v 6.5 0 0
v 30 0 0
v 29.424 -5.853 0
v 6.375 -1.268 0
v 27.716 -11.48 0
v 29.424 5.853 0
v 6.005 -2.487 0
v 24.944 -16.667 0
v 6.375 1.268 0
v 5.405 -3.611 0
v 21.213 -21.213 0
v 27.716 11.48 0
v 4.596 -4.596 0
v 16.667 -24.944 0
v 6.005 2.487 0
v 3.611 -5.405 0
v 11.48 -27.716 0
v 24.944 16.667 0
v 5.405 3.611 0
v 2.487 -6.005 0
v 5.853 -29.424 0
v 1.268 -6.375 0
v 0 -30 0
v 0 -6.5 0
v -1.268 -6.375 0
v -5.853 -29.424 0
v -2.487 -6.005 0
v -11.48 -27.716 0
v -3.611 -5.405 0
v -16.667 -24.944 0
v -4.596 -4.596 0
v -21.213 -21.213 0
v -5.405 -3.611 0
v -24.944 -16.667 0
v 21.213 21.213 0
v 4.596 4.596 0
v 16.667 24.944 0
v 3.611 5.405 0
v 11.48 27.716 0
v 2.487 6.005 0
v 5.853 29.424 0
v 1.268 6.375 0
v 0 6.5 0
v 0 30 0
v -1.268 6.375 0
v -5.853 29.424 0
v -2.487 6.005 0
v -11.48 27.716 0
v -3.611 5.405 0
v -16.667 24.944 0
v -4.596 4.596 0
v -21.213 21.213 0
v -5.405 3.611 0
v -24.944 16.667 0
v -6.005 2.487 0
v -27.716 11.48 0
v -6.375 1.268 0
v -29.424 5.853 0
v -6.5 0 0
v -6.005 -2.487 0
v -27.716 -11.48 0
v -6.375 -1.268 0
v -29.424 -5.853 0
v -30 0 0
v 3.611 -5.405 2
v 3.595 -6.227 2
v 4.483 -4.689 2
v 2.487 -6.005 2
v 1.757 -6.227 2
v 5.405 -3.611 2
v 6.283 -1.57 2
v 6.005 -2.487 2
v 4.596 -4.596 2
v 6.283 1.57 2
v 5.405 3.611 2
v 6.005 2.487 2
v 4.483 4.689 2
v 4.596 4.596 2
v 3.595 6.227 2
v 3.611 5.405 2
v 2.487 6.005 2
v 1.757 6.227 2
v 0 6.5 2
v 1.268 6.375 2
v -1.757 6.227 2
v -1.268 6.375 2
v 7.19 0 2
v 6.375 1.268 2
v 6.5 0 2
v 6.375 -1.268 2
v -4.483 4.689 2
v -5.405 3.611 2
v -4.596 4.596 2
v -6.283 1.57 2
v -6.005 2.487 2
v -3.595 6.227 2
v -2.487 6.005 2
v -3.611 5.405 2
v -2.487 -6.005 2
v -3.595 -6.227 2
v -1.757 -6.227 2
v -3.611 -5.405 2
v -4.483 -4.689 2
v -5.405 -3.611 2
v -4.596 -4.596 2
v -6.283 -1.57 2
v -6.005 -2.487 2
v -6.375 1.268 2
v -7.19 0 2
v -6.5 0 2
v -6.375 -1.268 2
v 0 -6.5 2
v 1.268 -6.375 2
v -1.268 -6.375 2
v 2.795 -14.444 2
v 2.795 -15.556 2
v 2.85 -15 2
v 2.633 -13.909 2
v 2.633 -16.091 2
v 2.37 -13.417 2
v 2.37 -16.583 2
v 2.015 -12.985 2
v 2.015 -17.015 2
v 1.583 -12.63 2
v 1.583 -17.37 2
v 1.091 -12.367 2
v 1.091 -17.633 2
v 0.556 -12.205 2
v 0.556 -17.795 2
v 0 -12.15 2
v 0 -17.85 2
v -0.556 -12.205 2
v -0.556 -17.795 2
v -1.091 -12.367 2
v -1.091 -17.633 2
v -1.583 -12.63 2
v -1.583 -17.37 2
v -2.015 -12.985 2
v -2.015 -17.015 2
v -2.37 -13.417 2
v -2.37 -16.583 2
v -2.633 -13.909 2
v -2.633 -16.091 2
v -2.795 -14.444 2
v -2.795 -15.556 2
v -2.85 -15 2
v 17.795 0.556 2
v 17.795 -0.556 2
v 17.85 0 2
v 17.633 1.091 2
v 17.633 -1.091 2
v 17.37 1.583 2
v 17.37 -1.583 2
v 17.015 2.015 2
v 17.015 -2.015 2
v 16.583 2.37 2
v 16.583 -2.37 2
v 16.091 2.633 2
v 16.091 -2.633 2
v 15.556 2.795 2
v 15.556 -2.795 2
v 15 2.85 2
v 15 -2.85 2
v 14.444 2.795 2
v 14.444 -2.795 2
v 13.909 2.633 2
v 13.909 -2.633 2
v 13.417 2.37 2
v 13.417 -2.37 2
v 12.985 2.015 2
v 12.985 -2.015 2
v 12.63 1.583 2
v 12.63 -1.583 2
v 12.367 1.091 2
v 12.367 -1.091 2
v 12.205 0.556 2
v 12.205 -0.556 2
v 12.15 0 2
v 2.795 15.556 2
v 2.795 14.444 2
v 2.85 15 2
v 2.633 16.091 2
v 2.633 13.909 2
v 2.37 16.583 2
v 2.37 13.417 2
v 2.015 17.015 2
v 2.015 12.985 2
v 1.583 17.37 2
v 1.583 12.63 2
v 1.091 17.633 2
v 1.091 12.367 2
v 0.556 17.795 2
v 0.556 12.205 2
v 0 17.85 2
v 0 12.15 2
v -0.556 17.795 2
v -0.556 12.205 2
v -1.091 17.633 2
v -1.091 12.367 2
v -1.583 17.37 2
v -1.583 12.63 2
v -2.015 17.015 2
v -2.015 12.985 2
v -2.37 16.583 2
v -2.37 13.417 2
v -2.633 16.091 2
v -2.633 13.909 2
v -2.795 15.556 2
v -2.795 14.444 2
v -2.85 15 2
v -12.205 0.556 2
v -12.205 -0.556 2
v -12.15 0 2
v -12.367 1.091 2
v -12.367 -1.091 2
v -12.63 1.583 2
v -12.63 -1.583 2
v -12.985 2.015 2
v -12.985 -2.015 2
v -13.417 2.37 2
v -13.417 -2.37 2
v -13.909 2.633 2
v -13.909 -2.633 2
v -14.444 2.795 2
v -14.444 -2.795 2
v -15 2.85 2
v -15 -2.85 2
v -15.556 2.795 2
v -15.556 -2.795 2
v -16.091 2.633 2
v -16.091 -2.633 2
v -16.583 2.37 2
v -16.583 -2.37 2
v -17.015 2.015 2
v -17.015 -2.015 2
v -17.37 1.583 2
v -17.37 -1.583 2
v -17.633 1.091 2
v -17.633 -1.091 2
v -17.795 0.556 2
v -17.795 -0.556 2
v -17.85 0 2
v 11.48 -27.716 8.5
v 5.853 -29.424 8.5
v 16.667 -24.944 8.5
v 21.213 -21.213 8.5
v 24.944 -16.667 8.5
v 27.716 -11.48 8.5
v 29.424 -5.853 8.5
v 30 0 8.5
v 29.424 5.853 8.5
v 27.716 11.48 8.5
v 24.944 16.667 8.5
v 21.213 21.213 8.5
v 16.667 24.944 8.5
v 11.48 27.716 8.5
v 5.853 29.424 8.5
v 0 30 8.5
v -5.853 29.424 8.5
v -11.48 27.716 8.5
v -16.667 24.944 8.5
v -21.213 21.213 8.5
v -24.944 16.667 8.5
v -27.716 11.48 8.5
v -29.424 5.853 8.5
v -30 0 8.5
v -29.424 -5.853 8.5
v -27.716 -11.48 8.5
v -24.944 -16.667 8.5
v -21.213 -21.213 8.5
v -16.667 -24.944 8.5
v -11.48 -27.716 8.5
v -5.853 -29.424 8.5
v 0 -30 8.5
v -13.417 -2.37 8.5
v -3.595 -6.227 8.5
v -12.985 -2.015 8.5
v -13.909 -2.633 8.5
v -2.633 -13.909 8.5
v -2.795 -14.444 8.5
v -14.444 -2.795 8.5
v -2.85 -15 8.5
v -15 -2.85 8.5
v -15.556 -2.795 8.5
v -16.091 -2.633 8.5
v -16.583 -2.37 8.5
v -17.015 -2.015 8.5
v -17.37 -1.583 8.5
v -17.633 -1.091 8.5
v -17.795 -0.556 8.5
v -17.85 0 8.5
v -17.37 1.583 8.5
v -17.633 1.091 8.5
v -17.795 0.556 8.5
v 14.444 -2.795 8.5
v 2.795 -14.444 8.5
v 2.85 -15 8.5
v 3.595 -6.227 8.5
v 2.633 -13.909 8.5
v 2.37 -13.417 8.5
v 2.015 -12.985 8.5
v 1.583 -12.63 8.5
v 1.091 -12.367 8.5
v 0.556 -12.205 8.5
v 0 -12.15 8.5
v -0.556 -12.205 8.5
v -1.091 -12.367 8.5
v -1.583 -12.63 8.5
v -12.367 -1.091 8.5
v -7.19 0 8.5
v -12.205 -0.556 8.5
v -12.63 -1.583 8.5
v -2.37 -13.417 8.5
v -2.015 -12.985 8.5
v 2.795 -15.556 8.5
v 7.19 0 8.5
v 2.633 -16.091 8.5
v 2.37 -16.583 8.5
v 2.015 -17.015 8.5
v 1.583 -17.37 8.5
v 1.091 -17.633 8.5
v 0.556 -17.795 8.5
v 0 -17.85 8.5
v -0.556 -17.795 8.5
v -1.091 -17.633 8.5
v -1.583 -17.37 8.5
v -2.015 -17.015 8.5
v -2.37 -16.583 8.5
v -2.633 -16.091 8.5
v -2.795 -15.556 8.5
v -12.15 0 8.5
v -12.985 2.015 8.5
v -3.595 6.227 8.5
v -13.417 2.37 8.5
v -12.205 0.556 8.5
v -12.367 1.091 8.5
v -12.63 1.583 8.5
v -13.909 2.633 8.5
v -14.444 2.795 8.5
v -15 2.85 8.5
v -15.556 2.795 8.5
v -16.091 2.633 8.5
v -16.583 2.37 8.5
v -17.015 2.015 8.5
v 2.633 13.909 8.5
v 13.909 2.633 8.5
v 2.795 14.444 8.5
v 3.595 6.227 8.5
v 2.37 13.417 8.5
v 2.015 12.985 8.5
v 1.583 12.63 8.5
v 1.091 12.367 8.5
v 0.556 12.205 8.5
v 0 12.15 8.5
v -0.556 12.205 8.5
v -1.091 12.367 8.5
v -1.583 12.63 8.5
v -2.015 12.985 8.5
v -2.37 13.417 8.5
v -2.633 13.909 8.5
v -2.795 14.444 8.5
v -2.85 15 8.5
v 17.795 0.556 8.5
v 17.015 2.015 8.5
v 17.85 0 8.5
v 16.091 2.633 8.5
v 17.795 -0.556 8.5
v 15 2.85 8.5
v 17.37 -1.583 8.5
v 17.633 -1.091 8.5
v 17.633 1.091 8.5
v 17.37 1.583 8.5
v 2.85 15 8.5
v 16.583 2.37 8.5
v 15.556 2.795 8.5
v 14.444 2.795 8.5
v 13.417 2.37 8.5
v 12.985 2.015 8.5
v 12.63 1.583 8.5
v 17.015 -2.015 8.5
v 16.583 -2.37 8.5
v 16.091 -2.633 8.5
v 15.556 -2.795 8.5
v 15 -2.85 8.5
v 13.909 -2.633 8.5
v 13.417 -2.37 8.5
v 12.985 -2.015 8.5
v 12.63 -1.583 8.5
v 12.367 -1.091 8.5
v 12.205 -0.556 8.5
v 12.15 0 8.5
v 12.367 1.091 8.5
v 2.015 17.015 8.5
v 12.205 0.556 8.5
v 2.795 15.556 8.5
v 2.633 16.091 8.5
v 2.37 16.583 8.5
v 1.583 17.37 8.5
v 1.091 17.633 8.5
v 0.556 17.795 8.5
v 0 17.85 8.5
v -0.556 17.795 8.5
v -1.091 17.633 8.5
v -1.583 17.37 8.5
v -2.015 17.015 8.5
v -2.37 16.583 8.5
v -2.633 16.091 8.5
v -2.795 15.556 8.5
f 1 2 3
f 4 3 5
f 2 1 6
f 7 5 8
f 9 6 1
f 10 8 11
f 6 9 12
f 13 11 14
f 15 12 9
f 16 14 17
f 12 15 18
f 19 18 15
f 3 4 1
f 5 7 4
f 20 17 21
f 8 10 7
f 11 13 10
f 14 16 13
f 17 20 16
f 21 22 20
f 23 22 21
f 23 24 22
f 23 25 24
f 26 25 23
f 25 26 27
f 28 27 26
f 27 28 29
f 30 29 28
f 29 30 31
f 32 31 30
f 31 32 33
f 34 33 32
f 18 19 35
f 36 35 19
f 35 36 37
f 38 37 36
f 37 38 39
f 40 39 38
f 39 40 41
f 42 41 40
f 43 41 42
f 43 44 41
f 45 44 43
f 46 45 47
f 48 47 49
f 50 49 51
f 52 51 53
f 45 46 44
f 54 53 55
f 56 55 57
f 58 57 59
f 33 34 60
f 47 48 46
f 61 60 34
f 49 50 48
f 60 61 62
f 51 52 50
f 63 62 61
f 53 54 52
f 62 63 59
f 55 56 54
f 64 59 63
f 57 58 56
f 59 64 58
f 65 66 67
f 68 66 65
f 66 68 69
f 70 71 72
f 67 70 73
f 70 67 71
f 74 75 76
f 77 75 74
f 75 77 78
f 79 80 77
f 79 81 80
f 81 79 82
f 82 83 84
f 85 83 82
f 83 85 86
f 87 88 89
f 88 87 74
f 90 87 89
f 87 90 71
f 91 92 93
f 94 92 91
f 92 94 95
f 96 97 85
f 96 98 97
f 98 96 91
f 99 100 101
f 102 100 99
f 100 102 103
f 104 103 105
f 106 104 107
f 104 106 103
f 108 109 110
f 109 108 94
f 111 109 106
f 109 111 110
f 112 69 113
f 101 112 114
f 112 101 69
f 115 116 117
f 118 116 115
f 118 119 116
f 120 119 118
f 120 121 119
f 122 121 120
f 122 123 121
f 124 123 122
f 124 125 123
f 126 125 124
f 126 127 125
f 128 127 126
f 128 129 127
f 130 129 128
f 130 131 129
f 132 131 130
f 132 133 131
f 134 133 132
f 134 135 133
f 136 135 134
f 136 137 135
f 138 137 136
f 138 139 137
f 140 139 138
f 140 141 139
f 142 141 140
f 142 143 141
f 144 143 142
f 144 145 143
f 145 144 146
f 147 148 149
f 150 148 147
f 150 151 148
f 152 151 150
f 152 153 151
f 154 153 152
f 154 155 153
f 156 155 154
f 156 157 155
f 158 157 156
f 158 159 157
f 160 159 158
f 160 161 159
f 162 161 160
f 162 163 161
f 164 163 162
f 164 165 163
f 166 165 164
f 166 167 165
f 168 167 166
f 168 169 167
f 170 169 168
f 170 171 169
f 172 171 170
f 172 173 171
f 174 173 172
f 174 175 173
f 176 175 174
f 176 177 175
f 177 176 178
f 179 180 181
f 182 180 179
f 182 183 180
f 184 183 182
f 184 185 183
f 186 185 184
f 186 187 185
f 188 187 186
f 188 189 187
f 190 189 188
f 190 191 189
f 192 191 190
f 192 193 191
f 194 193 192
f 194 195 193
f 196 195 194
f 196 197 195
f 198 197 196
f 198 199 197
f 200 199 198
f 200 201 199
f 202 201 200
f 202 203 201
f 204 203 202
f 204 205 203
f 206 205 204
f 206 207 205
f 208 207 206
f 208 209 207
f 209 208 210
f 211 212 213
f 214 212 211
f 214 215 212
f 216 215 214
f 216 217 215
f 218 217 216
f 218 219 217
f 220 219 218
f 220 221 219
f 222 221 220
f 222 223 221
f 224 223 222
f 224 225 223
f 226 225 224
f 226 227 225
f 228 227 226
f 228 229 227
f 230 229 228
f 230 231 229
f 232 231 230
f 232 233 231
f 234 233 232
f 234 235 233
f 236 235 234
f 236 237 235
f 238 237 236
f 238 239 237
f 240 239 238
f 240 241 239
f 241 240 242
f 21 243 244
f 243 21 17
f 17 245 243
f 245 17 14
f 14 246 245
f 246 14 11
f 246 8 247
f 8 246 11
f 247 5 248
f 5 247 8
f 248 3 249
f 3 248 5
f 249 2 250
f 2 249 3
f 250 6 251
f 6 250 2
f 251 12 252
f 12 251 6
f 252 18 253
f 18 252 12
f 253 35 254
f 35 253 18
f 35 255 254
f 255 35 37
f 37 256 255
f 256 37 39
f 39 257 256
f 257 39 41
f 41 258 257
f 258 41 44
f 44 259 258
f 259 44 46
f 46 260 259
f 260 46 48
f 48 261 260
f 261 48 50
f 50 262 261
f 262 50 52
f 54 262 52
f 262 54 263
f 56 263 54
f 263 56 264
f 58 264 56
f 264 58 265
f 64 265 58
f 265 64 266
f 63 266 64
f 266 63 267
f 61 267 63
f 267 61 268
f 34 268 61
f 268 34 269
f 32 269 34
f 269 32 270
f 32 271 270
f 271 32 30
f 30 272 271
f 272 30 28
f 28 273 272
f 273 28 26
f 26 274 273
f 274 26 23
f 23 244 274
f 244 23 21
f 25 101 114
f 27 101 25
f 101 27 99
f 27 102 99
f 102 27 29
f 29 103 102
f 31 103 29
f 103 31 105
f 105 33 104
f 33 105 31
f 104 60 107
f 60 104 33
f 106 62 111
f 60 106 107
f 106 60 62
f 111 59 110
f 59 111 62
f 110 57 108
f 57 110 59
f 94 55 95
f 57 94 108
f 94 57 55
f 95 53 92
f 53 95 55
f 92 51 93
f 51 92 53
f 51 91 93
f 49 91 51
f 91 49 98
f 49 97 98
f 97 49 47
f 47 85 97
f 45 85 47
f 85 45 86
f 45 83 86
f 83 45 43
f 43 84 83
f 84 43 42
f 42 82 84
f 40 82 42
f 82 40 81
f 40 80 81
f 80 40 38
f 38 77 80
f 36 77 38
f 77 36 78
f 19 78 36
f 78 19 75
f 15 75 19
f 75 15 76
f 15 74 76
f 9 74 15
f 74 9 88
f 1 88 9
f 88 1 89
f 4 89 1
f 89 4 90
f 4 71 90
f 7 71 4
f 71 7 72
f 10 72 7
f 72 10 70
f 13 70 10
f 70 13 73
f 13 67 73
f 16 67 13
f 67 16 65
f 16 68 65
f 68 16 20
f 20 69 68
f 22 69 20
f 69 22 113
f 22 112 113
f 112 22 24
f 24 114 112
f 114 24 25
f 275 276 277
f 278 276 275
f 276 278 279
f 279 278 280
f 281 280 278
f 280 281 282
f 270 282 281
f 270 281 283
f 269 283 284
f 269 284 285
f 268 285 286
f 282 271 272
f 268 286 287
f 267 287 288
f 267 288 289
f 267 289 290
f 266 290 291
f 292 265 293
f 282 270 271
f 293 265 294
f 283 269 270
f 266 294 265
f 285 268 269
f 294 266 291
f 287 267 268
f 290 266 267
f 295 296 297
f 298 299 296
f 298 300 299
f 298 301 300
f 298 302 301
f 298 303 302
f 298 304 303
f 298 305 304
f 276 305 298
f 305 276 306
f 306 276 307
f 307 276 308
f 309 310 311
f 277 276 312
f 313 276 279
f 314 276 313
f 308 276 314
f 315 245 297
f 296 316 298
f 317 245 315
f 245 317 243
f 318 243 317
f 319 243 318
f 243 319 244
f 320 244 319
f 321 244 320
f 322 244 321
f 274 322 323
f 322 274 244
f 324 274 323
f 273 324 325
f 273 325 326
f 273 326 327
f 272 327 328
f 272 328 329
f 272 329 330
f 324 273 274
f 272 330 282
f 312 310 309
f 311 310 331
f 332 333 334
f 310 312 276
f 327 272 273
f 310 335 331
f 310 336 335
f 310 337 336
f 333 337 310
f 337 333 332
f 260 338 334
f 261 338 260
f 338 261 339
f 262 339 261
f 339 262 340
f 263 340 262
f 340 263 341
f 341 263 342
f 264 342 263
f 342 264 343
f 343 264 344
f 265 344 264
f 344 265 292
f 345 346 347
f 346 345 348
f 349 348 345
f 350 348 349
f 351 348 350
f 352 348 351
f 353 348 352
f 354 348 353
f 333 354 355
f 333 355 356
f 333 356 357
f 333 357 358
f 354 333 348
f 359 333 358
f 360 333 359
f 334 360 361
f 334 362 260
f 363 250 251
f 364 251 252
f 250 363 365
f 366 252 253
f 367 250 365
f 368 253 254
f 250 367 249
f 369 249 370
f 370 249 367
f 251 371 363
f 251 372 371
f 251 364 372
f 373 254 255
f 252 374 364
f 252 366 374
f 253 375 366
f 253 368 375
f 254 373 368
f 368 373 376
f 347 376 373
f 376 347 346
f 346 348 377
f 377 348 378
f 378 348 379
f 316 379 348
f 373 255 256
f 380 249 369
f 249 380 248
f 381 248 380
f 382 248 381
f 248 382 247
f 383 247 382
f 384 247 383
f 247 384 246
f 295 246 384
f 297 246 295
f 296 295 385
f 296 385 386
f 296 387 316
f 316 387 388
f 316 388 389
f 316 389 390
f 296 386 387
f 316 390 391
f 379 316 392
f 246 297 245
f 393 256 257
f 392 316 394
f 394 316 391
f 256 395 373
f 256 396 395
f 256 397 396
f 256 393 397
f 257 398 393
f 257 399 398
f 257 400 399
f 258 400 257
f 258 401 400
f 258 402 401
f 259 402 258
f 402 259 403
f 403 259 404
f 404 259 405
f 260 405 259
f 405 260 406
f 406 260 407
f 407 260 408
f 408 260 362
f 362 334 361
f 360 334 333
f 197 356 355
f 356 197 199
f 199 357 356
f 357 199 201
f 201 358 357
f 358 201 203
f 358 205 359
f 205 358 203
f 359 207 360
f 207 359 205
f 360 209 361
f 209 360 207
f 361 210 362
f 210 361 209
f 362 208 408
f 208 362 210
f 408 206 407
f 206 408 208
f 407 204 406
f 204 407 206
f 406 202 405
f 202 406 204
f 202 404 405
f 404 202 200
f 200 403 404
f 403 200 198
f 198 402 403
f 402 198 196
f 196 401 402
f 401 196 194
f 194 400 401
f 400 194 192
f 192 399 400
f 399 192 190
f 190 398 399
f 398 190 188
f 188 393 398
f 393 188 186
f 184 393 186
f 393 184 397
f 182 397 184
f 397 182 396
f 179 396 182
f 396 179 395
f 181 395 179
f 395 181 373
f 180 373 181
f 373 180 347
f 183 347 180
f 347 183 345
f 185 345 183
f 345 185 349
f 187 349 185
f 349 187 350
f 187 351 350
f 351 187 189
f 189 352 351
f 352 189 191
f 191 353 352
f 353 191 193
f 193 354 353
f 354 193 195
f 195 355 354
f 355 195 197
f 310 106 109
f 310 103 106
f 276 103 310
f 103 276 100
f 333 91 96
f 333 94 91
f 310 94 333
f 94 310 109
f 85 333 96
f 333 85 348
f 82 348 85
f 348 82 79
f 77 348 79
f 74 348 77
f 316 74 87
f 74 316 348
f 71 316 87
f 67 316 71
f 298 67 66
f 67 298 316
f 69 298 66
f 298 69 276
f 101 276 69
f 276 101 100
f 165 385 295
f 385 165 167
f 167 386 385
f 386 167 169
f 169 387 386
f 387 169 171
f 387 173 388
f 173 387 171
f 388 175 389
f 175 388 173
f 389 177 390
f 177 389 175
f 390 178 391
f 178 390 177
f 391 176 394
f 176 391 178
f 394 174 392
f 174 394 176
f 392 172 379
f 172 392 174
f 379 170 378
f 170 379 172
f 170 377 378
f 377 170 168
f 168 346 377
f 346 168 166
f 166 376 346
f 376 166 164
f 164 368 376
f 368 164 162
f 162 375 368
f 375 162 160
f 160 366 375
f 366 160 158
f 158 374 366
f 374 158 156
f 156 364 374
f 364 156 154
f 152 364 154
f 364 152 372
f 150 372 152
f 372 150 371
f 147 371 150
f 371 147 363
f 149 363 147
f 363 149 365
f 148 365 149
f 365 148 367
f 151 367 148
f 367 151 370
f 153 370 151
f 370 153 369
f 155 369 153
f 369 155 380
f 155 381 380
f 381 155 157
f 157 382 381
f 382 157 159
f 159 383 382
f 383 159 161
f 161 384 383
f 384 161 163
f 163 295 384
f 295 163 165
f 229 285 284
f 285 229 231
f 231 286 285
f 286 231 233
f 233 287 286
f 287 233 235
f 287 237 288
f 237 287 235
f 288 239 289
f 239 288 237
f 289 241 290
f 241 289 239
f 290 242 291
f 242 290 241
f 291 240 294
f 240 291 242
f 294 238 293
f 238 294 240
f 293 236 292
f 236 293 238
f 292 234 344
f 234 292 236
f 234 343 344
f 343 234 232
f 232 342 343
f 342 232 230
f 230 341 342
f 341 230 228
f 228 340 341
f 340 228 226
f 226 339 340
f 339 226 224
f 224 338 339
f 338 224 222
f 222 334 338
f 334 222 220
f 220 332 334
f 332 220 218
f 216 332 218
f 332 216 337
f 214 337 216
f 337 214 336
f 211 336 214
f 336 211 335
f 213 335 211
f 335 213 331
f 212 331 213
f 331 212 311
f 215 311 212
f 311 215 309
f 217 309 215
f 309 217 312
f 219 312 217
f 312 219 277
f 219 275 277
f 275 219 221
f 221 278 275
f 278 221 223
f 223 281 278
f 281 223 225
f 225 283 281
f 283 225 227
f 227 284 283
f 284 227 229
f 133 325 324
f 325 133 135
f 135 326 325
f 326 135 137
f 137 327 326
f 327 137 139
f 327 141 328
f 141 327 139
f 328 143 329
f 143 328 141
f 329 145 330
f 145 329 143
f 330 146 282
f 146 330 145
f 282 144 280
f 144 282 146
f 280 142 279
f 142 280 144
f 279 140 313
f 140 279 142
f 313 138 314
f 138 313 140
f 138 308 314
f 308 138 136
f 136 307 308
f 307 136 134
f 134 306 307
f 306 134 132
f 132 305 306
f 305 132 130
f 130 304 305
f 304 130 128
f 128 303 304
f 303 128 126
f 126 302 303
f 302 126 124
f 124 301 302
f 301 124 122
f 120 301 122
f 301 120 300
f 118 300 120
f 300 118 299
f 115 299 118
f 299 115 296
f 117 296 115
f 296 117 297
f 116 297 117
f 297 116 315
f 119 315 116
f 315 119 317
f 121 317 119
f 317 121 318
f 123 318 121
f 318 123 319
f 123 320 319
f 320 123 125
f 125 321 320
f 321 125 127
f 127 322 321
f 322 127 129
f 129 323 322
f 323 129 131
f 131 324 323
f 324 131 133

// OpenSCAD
// file: oem/generic/lib.scad
$fn = 32;

kEpsilon = 1e-1;

function property(table, key) = table[search([key], table)[0]][1];

module sector(radius, angles, fn = $fn) {
     r = radius / cos(180 / fn);
     step = -360 / fn;

     points = concat([[0, 0]],
                     [for(a = [angles[0] : step : angles[1] - 360])
                               [r * cos(a), r * sin(a)]
                          ],
                     [[r * cos(angles[1]), r * sin(angles[1])]]
          );

     difference() {
          circle(radius, $fn = fn);
          polygon(points);
     }
}

module ring(inner_radius, outer_radius, angles = [0, 360], fn = $fn) {
     difference() {
          sector(radius=outer_radius, angles=angles, fn=fn);
          sector(radius=inner_radius, angles=angles+[-kEpsilon, kEpsilon], fn=fn);
     }
}

module rounded_ring(inner_radius, outer_radius, angles = [0, 360], fn = $fn) {
     step_angle = 360 / fn;
     ring_width = outer_radius - inner_radius;
     ring_mean_radius = (outer_radius + inner_radius) / 2;
     for (theta = angles) {
          theta_d = theta / step_angle;
          theta_frac = (theta_d - floor(theta_d) - 0.5) * step_angle;
          rho = ring_mean_radius * cos(step_angle/2) / cos(theta_frac);
          rotate(theta)
          translate([rho, 0])
          circle(d=ring_width);
     }
     ring(inner_radius=inner_radius,
          outer_radius=outer_radius,
          angles=angles, fn=fn);
}

module fillet(r) {
     difference() {
          difference() {
               offset(r=-r - kEpsilon)
                    offset(delta=r) {
                    children();
               }
               offset(r=r)
                    offset(delta=-r) {
                    children();
               }
          }
          children();
     }
     offset(r=r)
          offset(delta=-r) {
          children();
     }
}

module bench_fillet(r, order=1000) {
     difference() {
          fillet(r) {
               translate([-order/2-kEpsilon, 0]) {
                    square([order, order], center=true);
               }
               children();
          }
          translate([-order/2-kEpsilon, 0]) {
               square([order+kEpsilon, order+kEpsilon], center=true);
          }
     }
}

module curved_bench_fillet(r, bench_radius, order=1000, internal=true) {
     difference() {
          fillet(r) {
               if (internal) {
                    translate([bench_radius, 0]) {
                         ring(inner_radius=bench_radius + kEpsilon, outer_radius=bench_radius * order);
                    }
               } else {
                    translate([-bench_radius, 0]) circle(r=bench_radius - kEpsilon);
               }
               children();
          }
          if (internal) {
               translate([bench_radius, 0]) {
                    ring(inner_radius=bench_radius,
                         outer_radius=bench_radius * order - kEpsilon);
               }
          } else {
               translate([-bench_radius, 0]) circle(r=bench_radius);
          }

     }
}


module window(side, position=[0, 0, 0], order=1000) {
    difference() {
        children();
        translate(position)  {
            difference() {
                square(order, center=true);
                square(side, center=true);
            }
        }
    }
}


module rounded_cylinder(diameter, height, fillet_radius, center) {
     translate([0, 0, ! center ? height/2 : 0]) {
          minkowski() {
               cylinder(d=(diameter - 2 * fillet_radius),
                        h=(height - 2 * fillet_radius),
                        center=true);
               sphere(r=fillet_radius);
          }
     }
}


module curved_support_xsection(support_radius, fillet_radius,
                               wall_inner_radius, wall_outer_radius,
                               hole_radius = 0, internal=true) {
     support_angular_width = (4 * support_radius / wall_outer_radius) * 180 / PI;
     wall_thickness = wall_outer_radius - wall_inner_radius;
     rotate([0, 0, internal ? 180 : 0]) {
          difference() {
               window(6*support_radius) {
                    curved_bench_fillet(fillet_radius, bench_radius=wall_inner_radius, internal=internal) {
                         hull() {
                              translate([support_radius + wall_thickness/2, 0]) {
                                   circle(r=support_radius);
                              }
                              rotate([0, 0, ! internal ? 180 : 0])
                              translate([wall_inner_radius + wall_thickness/2, 0]) {
                                   ring(inner_radius=wall_inner_radius,
                                        outer_radius=wall_outer_radius,
                                        angles=[180 - support_angular_width/2,
                                                180 + support_angular_width/2]);
                              }
                         }
                         rotate([0, 0, ! internal ? 180 : 0])
                         translate([wall_inner_radius + wall_thickness/2, 0]) {
                              ring(inner_radius=wall_inner_radius,
                                   outer_radius=wall_outer_radius,
                                   angles=[180 - support_angular_width,
                                           180 + support_angular_width]);
                         }
                    }
               }
               if (hole_radius > 0) {
                    translate([support_radius + wall_thickness/2, 0]) {
                         circle(r=hole_radius);
                    }
               }
          }
     }
}

module fill(upto=1000) {
     offset(delta=-upto) {
          offset(delta=upto) {
               children();
          }
     }
}

module outline(delta) {
     if (delta > 0) {
          difference() {
               offset(delta=delta) {
                    children();
               }
               children();
          }
     } else {
          difference() {
               children();
               offset(delta=delta) {
                    children();
               }
          }
     }
}

module duplicate(v) {
     children();
     mirror(v) children();
}

function steps(start, end, n) = [start:(end - start)/(n - 1):end];

function sigmoid(x) = 1.0 / (1.0 + exp(-x));

module sigmoid_profile(length, width, order=10, fn = $fn) {
     step = length / fn;
     points = concat(
          [[0, 0]],
          [for (x = [step:step:length-step]) [x, width * sigmoid(2 * order * ((x / length) - 0.5))]],
          [[length, width], [0, width]]

     );
     polygon(points=points);
}

module exp_nerve_xsection(height, length, decay_rate = 5, fn = $fn) {
     step = length / fn;
     points = concat(
          [[0, 0]],
          [for (x = [0:step:length-step]) [x, height * exp(-x/decay_rate)]],
          [[length, 0]]
          );
     polygon(points=points);
}

module exp_nerve(height, length, thickness, decay_rate = 3, fn = $fn) {
     rotate([90, 0, 0])
     linear_extrude(height=thickness, center=true) {
          exp_nerve_xsection(height, length, decay_rate, fn);
     }
}

module exp_corner_nerve(height, radius, angles, corner_radius = 0, decay_rate = 3, fn = $fn) {
     difference() {
          rotate_extrude() {
               if (corner_radius > 0) {
                    translate([corner_radius, 0, 0])
                    exp_nerve_xsection(height=height, length=radius, decay_rate=decay_rate, fn=fn);
               } else {
                    translate([-corner_radius, 0, 0])
                    mirror([1, 0, 0])
                    exp_nerve_xsection(height=height, length=radius, decay_rate=decay_rate, fn=fn);
               }
          }
          linear_extrude(height=2 * height, center=true) {
               sector(radius=radius + abs(corner_radius), angles=[angles[1], angles[0] + 360], fn=fn);
          }
     }
}
// file: chassis_base.scad
include <generic/lib.scad>;

function vChassisBaseDatasheet() =
     let(outer_diameter=350, thickness=2, inner_diameter=outer_diameter - 2 * thickness,
         base_height=100, height=120, inner_height=height - 2 * thickness)
     [["outer_diameter", outer_diameter], ["inner_diameter", inner_diameter],
      ["base_height", base_height], ["height", height], ["inner_height", inner_height],
      ["thickness", thickness], ["support_diameter", 10], ["z_offset", 20], ["fillet_radius", 8]];

module mChassisOuterVolume() {
     datasheet = vChassisBaseDatasheet();
     rounded_cylinder(diameter=property(datasheet, "outer_diameter"),
                      height=property(datasheet, "height"),
                      fillet_radius=property(datasheet, "fillet_radius"));
}

module mChassisInnerVolume() {
     datasheet = vChassisBaseDatasheet();
     translate([0, 0, property(datasheet, "thickness")]) {
          rounded_cylinder(diameter=property(datasheet, "inner_diameter"),
                           height=property(datasheet, "inner_height"),
                           fillet_radius=property(datasheet, "fillet_radius"));
     }
}

module mChassisBBox() {
     datasheet = vChassisBaseDatasheet();
     chassis_height = property(datasheet, "height");
     chassis_outer_diameter = property(datasheet, "outer_diameter");
     translate([0., 0., chassis_height/2]) {
          cube([chassis_outer_diameter, chassis_outer_diameter, chassis_height], center=true);
     }
}

module mChassisShell() {
     difference() {
          mChassisOuterVolume();
          mChassisInnerVolume();
     }
}

module mChassisVolumeConstrain() {
     datasheet = vChassisBaseDatasheet();
     height = property(datasheet, "height");
     outer_diameter = property(datasheet, "outer_diameter");
     fillet_radius = property(datasheet, "fillet_radius");
     difference() {
          rounded_cylinder(diameter=outer_diameter,
                           height=height,
                           fillet_radius=fillet_radius);
          difference() {
               translate([0, 0, -kEpsilon]) {
                    rounded_cylinder(diameter=outer_diameter + kEpsilon,
                                     height=height + 2 * kEpsilon,
                                     fillet_radius=fillet_radius);
               }
               children();
          }
     }
}
// file: oem/usb_type_a_panel_connector.scad
include <generic/lib.scad>;


function vUSBTypeAPanelConnectorDatasheet() =
     [["conn_height", 16.8], ["cutout_length", 12.3], ["cutout_width", 26.5],
      ["flare_height", 4.5], ["flare_length", 18], ["flare_width", 30.31]];


module mUSBTypeAPanelConnector() {
     module mUSBTypeAFemaleConnector() {
          rotate([0, 0, 90]) {
               translate([-53.92913818, 0.57096958, 0.19999933]) {
                    import("stl/usb_type_a_female_connector.stl");
               }
          }
     }

     datasheet = vUSBTypeAPanelConnectorDatasheet();
     flare_height = property(datasheet, "flare_height");
     flare_length = property(datasheet, "flare_length");
     flare_width = property(datasheet, "flare_width");
     linear_extrude(height=flare_height) {
          difference() {
               square([flare_length, flare_width], center=true);
               hull() projection() mUSBTypeAFemaleConnector();
          }
     }
     conn_height = property(datasheet, "conn_height");
     translate([0, 0, flare_height-conn_height/2]) {
          mUSBTypeAFemaleConnector();
     }
}


mUSBTypeAPanelConnector();
// file: oem/sma_female_bulkhead_connector.scad
module mSMAFemaleBulkheadConnectorCutuotSection() {
     difference() {
          circle(d=6.4);
          translate([0, -6.0, 0]) {
               square(6.4, center=true);
          }
     }
}


module mSMAFemaleBulkheadConnector() {
     rotate([0, 0, 90]) {
          translate ([0, 0, -12.5]) {
               rotate([0, -90, 0]) {
                    scale([25.4, 25.4, 25.4]) {  // inch to mm
                         import("stl/sma_female_bulkhead_connector.stl");
                    }
               }
          }
     }
}


mSMAFemaleBulkheadConnector();
// file: oem/rplidar_a1m8_r1.scad
function vRPLidarA1M8R1Datasheet() =
     [["working_width", 6], ["range", 6000]];


module mRPLidarA1M8R1() {
     translate([-35.14, 35, 0]) {
          rotate([90, 0, 0]) import("stl/RPLIDAR-A1M8-R1.stl");
     }
}
// file: oem/16mm_led_pushbutton.scad
function v16mmLEDPushbuttonDatasheet() = [["cutout_diameter", 16]];


module m16mmLEDPushbutton() {
     rotate([0, 0, -90]) import("stl/16mm_led_pushbutton.stl");
}
// file: oem/m8_nut.scad
function vM8NutDatasheet() =
     [["e_min", 14.38], ["s_max", 13], ["m_max", 6.5]];

module mM8Nut() {
     import("stl/m8-nut.stl");
}
// file: oem/m3x12mm_phillips_screw.scad
function vM3x12mmPhillipsScrewDatasheet() =
     [["nominal_diameter", 3], ["max_head_diameter", 5.7], ["max_head_height", 2.4]];

module mM3x12mmPhillipsScrew() {
     import("stl/m3x12mm_phillips_screw.stl");
}

mM3x12mmPhillipsScrew();
// main file
include <generic/lib.scad>;

use <oem/m3x12mm_phillips_screw.scad>;
use <oem/m8_nut.scad>;

use <chassis_base_cover.scad>;

function vPolePlug_PartA_Datasheet() =
     let(cover_datasheet=vChassisBaseCoverDatasheet(), outer_diameter=60,
         inner_diameter=property(cover_datasheet, "pole_socket_diameter"),
         base_thickness=2)
     [["outer_diameter", outer_diameter], ["inner_diameter", inner_diameter],
      ["height", property(vM8NutDatasheet(), "m_max") + base_thickness],
      ["base_thickness", base_thickness], ["fastening_angles", [0, 90, 180, 270]],
      ["fastening_r_offset", 15]];

function vPolePlugScrewDatasheet() =
     vM3x12mmPhillipsScrewDatasheet();

module mPolePlugNut() {
     mM8Nut();
}

module mPolePlugScrew() {
     mM3x12mmPhillipsScrew();
}

module mPolePlug_PartA() {
     datasheet = vPolePlug_PartA_Datasheet();
     base_thickness = property(datasheet, "base_thickness");
     outer_diameter = property(datasheet, "outer_diameter");
     fastening_angles = property(datasheet, "fastening_angles");
     fastening_r_offset = property(datasheet, "fastening_r_offset");

     nut_datasheet = vM8NutDatasheet();
     screw_datasheet = vPolePlugScrewDatasheet();

     linear_extrude(height=base_thickness) {
          ring(outer_radius=outer_diameter/2, inner_radius=property(nut_datasheet, "s_max")/2);
     }
     translate([0, 0, base_thickness]) {
          linear_extrude(height=property(nut_datasheet, "m_max")) {
               difference() {
                    circle(d=outer_diameter);
                    circle(d=property(nut_datasheet, "e_min"), $fn=6);
                    for(angle = fastening_angles) {
                         rotate([0, 0, angle]) {
                              translate([fastening_r_offset, 0]) {
                                   circle(d=property(screw_datasheet, "max_head_diameter"));
                              }
                         }
                    }
               }
          }
     }
}

mPolePlug_PartA();
